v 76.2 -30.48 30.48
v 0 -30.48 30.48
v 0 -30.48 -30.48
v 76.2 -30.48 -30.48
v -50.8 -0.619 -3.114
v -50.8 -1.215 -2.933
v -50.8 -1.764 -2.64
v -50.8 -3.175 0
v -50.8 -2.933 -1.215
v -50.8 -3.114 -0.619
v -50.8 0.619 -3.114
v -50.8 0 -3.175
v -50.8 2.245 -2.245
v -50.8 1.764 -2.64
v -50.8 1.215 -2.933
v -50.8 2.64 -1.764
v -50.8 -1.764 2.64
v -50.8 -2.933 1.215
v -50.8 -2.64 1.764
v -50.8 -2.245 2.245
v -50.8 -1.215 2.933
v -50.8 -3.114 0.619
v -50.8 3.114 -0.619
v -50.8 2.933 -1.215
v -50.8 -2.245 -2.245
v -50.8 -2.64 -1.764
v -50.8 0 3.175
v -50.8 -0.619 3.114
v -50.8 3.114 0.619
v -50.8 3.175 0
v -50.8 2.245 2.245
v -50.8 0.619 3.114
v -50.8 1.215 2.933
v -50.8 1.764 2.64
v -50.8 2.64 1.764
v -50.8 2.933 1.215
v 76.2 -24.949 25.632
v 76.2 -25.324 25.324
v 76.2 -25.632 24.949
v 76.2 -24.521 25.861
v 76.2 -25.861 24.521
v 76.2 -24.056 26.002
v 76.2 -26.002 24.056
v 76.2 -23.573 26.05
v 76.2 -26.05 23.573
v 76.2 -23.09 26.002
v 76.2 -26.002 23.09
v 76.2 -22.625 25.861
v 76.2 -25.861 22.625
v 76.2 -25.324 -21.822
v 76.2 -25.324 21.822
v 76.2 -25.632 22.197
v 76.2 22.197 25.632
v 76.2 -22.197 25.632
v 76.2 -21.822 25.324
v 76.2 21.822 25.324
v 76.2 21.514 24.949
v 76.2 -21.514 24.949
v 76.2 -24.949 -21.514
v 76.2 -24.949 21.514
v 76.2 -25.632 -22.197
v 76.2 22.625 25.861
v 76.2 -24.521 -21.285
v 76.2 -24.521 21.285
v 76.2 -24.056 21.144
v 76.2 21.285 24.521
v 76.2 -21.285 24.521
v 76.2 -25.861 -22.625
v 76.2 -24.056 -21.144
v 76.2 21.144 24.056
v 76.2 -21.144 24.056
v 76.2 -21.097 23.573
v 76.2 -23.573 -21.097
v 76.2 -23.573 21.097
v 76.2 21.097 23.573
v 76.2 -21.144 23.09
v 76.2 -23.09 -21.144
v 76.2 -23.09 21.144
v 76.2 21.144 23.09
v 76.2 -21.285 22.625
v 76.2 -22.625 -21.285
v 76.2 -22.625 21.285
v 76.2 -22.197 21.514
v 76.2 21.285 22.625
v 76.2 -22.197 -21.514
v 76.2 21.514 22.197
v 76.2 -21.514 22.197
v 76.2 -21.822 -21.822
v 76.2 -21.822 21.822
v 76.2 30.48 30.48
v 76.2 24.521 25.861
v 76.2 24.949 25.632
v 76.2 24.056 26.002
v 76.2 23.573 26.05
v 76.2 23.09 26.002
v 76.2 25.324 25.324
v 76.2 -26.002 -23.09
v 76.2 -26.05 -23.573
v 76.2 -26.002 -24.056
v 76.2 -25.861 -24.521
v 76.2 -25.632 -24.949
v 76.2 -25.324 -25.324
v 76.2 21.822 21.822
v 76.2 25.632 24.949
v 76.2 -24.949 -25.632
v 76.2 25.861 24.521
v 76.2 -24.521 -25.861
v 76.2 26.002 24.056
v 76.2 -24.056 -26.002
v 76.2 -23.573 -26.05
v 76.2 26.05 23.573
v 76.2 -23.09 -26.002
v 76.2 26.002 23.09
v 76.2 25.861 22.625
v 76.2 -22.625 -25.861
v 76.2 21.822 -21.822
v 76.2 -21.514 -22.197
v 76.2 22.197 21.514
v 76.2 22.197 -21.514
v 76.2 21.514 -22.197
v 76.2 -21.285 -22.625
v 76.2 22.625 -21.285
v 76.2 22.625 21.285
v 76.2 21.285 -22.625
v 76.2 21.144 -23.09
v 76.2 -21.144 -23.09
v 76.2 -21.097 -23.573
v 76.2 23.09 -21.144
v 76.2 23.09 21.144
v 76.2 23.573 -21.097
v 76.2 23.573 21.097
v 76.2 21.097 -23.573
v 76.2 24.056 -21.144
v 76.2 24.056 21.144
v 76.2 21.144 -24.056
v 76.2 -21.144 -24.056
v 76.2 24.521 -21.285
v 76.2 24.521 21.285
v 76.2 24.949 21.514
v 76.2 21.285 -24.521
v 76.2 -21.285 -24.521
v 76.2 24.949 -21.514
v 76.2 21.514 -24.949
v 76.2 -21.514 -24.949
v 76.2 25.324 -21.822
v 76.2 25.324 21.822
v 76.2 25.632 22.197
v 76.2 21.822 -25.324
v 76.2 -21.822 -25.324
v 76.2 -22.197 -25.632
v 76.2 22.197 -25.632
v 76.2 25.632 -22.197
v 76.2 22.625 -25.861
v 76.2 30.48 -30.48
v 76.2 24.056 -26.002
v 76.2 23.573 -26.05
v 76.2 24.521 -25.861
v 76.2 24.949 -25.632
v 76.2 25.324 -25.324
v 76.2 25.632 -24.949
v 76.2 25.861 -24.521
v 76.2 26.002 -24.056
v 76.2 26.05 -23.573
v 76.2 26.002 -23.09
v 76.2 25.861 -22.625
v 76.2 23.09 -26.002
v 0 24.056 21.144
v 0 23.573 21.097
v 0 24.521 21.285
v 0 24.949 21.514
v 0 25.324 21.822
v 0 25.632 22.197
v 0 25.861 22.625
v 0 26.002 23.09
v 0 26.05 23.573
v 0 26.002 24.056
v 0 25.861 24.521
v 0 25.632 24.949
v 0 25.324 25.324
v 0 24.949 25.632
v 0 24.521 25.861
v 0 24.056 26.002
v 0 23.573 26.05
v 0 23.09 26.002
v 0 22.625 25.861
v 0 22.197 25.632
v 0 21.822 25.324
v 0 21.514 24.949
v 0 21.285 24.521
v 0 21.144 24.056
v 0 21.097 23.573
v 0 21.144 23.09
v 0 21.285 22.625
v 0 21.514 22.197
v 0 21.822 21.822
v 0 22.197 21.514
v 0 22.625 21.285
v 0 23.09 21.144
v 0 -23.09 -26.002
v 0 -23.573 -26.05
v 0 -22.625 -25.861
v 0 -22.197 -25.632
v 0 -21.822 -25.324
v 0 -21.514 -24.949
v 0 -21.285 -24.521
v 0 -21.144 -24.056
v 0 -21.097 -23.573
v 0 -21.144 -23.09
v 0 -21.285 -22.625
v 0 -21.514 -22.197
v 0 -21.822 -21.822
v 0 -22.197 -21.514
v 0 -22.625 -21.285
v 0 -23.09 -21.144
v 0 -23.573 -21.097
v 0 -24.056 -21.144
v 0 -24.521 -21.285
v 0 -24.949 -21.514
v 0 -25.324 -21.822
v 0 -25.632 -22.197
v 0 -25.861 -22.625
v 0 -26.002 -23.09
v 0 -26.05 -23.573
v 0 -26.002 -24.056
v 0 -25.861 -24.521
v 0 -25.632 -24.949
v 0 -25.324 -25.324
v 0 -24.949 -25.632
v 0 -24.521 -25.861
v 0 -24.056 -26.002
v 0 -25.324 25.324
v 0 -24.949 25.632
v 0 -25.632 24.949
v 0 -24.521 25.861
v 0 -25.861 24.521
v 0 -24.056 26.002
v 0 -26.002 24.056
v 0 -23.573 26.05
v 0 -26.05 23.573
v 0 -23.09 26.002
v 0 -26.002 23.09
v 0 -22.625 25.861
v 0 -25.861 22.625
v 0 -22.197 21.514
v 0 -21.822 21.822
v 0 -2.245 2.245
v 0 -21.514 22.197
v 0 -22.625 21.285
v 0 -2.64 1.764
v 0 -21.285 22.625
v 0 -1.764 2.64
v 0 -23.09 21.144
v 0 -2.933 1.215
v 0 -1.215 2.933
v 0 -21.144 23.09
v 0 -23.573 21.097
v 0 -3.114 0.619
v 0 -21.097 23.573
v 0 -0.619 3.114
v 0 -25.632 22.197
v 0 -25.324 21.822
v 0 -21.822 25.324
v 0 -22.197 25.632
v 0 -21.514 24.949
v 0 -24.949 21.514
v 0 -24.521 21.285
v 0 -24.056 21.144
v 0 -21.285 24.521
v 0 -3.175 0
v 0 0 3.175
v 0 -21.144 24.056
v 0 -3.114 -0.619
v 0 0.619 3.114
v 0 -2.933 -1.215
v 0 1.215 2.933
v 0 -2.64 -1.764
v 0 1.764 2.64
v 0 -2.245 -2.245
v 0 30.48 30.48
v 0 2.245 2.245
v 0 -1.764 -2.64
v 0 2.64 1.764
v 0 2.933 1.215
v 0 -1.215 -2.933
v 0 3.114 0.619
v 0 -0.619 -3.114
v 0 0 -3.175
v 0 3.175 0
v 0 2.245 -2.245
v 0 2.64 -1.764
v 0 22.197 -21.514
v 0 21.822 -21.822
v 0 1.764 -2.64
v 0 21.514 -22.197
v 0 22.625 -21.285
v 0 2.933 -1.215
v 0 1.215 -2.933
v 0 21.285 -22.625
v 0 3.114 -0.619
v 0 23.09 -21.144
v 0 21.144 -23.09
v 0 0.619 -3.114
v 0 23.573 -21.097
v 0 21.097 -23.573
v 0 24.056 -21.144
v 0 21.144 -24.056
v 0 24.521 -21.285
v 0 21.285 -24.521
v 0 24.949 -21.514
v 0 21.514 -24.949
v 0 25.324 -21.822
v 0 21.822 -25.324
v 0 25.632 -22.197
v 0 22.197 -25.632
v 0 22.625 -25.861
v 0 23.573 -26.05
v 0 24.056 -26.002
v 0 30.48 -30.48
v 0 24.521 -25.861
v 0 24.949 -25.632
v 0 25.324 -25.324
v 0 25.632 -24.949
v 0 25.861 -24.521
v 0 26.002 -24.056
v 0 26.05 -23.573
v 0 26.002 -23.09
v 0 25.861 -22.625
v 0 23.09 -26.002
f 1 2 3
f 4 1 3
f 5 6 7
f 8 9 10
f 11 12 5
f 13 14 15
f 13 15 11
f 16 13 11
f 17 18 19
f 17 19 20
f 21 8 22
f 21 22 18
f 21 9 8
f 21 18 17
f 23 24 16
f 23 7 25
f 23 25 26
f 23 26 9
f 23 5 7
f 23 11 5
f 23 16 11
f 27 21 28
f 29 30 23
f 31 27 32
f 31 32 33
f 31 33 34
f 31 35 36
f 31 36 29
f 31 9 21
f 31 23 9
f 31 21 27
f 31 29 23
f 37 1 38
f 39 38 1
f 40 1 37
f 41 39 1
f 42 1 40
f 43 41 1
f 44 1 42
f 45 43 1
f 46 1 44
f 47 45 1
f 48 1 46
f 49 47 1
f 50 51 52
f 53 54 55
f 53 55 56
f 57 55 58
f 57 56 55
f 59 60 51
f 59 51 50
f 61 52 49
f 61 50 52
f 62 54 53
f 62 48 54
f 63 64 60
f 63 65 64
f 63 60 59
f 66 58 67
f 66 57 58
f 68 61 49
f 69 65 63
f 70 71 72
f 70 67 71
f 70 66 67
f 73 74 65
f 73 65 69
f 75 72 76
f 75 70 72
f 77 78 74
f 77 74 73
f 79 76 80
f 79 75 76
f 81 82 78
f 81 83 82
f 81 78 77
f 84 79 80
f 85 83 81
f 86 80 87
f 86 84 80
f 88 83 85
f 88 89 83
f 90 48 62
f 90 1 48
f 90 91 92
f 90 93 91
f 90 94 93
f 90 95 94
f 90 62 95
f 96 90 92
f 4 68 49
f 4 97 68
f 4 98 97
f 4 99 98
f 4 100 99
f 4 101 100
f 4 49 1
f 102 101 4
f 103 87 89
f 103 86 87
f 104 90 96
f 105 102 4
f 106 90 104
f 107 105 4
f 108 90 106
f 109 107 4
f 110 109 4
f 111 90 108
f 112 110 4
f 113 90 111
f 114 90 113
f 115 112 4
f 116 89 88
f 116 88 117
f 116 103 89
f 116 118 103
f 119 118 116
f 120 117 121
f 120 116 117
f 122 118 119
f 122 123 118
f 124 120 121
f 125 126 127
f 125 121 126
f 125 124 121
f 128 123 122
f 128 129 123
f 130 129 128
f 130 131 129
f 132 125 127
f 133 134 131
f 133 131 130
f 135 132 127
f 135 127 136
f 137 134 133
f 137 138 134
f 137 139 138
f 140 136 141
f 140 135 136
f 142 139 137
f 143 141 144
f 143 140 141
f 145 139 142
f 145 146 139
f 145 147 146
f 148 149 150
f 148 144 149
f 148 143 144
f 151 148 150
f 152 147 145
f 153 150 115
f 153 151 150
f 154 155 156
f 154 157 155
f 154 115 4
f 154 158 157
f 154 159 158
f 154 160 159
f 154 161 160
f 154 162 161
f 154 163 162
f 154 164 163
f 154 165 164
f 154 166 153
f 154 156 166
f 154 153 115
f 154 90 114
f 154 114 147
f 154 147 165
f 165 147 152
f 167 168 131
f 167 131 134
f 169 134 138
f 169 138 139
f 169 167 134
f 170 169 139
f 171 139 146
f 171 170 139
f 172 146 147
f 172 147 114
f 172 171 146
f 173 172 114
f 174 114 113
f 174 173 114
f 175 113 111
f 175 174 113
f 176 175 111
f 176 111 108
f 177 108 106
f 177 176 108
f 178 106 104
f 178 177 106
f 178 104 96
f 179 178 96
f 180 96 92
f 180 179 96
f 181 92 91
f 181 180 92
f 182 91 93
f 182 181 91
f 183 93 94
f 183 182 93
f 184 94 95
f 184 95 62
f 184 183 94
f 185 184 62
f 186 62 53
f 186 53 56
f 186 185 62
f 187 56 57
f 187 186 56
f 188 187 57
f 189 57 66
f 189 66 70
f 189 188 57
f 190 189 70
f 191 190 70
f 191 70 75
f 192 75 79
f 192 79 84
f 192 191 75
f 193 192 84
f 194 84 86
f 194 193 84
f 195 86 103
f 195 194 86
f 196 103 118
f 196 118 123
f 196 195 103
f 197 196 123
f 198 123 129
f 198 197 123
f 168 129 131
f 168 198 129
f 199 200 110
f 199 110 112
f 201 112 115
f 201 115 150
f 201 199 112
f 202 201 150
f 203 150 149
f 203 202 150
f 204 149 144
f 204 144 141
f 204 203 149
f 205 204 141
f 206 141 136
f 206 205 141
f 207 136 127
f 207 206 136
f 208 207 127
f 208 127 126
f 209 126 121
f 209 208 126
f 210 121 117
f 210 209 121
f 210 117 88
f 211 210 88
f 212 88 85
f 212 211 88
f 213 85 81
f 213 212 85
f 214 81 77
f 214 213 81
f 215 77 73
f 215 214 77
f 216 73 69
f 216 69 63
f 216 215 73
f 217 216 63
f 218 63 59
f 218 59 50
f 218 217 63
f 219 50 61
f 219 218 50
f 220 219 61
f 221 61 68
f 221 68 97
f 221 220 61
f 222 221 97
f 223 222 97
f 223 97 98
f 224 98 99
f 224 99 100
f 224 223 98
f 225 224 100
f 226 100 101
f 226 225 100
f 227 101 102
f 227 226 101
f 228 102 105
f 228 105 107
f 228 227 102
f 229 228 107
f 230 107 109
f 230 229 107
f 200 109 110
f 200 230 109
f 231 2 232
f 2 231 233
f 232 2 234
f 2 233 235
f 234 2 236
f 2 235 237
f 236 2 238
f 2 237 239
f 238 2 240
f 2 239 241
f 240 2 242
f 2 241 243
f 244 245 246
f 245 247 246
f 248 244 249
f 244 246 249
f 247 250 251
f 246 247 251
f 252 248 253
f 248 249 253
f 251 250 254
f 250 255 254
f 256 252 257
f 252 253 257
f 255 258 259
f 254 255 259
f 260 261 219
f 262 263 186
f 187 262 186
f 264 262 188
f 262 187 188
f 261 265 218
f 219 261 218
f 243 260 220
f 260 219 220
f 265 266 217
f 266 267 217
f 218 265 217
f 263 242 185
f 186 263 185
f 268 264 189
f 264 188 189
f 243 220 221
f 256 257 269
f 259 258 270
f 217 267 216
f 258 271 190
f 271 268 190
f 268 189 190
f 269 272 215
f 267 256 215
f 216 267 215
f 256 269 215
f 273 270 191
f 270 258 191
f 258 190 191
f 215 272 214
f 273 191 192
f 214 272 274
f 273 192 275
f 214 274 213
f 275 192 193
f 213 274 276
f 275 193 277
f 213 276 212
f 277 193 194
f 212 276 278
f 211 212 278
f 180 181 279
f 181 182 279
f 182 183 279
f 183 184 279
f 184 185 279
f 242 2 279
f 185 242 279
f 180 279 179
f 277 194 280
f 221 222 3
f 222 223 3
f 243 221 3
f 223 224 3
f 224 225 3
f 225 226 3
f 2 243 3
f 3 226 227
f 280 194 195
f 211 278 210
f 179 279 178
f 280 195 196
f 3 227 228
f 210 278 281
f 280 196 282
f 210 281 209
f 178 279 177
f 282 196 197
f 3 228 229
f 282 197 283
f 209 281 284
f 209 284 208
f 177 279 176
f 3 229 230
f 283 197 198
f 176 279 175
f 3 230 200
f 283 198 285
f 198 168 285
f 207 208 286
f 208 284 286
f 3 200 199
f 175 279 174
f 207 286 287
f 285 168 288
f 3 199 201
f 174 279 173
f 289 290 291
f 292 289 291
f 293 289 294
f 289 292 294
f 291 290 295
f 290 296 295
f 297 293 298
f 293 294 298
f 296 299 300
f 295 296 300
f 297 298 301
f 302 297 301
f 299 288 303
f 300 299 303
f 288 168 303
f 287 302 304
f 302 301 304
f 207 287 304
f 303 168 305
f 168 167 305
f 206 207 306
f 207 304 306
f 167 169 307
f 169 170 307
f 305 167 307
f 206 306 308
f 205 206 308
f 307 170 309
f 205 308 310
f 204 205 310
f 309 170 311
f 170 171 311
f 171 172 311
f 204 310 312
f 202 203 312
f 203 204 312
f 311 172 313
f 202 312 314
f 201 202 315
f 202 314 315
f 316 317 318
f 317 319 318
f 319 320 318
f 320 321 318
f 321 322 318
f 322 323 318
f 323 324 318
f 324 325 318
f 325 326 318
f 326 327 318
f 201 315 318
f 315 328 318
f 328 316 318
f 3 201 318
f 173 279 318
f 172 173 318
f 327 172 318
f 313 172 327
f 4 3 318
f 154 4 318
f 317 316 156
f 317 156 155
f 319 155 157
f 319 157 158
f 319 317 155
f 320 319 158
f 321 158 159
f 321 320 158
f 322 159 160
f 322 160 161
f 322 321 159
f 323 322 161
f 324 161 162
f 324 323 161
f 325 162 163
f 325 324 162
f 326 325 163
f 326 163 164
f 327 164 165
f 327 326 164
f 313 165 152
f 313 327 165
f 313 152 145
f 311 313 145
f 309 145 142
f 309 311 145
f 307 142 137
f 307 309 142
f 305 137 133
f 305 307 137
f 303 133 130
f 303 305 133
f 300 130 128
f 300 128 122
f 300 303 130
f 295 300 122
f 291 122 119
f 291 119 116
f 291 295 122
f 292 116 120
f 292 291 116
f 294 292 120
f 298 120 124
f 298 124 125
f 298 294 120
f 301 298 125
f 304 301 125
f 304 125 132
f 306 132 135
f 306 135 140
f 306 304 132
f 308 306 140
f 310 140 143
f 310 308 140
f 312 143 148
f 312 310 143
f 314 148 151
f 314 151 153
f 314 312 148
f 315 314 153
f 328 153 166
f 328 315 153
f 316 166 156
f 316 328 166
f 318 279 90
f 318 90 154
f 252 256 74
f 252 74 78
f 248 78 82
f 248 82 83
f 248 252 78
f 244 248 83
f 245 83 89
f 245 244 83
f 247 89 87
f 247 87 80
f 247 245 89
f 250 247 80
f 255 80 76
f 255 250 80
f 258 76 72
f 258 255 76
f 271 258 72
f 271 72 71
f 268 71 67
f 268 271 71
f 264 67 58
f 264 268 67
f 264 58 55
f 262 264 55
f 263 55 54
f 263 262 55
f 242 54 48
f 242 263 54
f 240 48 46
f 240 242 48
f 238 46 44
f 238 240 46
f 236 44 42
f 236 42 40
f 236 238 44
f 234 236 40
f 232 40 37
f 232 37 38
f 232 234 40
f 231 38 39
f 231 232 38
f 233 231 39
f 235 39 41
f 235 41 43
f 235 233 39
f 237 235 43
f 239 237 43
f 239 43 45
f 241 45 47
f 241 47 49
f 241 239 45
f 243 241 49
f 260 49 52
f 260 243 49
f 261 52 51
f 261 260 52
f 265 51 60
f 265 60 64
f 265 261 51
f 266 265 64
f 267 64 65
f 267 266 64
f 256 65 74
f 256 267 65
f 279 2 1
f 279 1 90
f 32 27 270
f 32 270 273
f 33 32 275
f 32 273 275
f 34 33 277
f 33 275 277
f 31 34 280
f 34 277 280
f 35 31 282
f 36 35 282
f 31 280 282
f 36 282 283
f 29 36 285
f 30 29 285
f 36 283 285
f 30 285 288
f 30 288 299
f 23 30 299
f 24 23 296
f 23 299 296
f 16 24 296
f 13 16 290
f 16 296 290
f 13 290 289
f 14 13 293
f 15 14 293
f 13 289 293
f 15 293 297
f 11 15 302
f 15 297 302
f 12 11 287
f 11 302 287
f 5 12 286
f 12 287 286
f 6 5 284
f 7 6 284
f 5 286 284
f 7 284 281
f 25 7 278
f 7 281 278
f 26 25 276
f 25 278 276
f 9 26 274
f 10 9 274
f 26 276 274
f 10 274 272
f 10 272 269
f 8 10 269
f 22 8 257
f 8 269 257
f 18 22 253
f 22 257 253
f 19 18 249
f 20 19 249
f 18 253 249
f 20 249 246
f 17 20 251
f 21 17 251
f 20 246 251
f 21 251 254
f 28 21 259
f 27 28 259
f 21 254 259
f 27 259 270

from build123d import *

# Parameters (mm, degrees)
SKETCH1_W           = 60.96
SKETCH1_H           = 60.96
SKETCH1_R           = 2.4765
BOSS_EXTRUDE3_DEPTH = 76.2
SKETCH3_R           = 3.175
BOSS_EXTRUDE4_DEPTH = 50.8


with BuildPart() as part:
    # Sketch1 → Boss-Extrude3 (new body)
    with BuildSketch(Plane(origin=(0, 0, 0), x_dir=(0, 0, -1), z_dir=(1, 0, 0))):
        Rectangle(SKETCH1_W, SKETCH1_H)
        with Locations((-23.573172318, 23.573172318)):
            Circle(SKETCH1_R, mode=Mode.SUBTRACT)
        with Locations((23.573172318, 23.573172318)):
            Circle(SKETCH1_R, mode=Mode.SUBTRACT)
        with Locations((23.573172318, -23.573172318)):
            Circle(SKETCH1_R, mode=Mode.SUBTRACT)
        with Locations((-23.573172318, -23.573172318)):
            Circle(SKETCH1_R, mode=Mode.SUBTRACT)
    extrude(amount=BOSS_EXTRUDE3_DEPTH)

    # Sketch3 → Boss-Extrude4 (add)
    with BuildSketch(Plane.ZY):
        Circle(SKETCH3_R)
    extrude(amount=BOSS_EXTRUDE4_DEPTH)


solid = part.part
